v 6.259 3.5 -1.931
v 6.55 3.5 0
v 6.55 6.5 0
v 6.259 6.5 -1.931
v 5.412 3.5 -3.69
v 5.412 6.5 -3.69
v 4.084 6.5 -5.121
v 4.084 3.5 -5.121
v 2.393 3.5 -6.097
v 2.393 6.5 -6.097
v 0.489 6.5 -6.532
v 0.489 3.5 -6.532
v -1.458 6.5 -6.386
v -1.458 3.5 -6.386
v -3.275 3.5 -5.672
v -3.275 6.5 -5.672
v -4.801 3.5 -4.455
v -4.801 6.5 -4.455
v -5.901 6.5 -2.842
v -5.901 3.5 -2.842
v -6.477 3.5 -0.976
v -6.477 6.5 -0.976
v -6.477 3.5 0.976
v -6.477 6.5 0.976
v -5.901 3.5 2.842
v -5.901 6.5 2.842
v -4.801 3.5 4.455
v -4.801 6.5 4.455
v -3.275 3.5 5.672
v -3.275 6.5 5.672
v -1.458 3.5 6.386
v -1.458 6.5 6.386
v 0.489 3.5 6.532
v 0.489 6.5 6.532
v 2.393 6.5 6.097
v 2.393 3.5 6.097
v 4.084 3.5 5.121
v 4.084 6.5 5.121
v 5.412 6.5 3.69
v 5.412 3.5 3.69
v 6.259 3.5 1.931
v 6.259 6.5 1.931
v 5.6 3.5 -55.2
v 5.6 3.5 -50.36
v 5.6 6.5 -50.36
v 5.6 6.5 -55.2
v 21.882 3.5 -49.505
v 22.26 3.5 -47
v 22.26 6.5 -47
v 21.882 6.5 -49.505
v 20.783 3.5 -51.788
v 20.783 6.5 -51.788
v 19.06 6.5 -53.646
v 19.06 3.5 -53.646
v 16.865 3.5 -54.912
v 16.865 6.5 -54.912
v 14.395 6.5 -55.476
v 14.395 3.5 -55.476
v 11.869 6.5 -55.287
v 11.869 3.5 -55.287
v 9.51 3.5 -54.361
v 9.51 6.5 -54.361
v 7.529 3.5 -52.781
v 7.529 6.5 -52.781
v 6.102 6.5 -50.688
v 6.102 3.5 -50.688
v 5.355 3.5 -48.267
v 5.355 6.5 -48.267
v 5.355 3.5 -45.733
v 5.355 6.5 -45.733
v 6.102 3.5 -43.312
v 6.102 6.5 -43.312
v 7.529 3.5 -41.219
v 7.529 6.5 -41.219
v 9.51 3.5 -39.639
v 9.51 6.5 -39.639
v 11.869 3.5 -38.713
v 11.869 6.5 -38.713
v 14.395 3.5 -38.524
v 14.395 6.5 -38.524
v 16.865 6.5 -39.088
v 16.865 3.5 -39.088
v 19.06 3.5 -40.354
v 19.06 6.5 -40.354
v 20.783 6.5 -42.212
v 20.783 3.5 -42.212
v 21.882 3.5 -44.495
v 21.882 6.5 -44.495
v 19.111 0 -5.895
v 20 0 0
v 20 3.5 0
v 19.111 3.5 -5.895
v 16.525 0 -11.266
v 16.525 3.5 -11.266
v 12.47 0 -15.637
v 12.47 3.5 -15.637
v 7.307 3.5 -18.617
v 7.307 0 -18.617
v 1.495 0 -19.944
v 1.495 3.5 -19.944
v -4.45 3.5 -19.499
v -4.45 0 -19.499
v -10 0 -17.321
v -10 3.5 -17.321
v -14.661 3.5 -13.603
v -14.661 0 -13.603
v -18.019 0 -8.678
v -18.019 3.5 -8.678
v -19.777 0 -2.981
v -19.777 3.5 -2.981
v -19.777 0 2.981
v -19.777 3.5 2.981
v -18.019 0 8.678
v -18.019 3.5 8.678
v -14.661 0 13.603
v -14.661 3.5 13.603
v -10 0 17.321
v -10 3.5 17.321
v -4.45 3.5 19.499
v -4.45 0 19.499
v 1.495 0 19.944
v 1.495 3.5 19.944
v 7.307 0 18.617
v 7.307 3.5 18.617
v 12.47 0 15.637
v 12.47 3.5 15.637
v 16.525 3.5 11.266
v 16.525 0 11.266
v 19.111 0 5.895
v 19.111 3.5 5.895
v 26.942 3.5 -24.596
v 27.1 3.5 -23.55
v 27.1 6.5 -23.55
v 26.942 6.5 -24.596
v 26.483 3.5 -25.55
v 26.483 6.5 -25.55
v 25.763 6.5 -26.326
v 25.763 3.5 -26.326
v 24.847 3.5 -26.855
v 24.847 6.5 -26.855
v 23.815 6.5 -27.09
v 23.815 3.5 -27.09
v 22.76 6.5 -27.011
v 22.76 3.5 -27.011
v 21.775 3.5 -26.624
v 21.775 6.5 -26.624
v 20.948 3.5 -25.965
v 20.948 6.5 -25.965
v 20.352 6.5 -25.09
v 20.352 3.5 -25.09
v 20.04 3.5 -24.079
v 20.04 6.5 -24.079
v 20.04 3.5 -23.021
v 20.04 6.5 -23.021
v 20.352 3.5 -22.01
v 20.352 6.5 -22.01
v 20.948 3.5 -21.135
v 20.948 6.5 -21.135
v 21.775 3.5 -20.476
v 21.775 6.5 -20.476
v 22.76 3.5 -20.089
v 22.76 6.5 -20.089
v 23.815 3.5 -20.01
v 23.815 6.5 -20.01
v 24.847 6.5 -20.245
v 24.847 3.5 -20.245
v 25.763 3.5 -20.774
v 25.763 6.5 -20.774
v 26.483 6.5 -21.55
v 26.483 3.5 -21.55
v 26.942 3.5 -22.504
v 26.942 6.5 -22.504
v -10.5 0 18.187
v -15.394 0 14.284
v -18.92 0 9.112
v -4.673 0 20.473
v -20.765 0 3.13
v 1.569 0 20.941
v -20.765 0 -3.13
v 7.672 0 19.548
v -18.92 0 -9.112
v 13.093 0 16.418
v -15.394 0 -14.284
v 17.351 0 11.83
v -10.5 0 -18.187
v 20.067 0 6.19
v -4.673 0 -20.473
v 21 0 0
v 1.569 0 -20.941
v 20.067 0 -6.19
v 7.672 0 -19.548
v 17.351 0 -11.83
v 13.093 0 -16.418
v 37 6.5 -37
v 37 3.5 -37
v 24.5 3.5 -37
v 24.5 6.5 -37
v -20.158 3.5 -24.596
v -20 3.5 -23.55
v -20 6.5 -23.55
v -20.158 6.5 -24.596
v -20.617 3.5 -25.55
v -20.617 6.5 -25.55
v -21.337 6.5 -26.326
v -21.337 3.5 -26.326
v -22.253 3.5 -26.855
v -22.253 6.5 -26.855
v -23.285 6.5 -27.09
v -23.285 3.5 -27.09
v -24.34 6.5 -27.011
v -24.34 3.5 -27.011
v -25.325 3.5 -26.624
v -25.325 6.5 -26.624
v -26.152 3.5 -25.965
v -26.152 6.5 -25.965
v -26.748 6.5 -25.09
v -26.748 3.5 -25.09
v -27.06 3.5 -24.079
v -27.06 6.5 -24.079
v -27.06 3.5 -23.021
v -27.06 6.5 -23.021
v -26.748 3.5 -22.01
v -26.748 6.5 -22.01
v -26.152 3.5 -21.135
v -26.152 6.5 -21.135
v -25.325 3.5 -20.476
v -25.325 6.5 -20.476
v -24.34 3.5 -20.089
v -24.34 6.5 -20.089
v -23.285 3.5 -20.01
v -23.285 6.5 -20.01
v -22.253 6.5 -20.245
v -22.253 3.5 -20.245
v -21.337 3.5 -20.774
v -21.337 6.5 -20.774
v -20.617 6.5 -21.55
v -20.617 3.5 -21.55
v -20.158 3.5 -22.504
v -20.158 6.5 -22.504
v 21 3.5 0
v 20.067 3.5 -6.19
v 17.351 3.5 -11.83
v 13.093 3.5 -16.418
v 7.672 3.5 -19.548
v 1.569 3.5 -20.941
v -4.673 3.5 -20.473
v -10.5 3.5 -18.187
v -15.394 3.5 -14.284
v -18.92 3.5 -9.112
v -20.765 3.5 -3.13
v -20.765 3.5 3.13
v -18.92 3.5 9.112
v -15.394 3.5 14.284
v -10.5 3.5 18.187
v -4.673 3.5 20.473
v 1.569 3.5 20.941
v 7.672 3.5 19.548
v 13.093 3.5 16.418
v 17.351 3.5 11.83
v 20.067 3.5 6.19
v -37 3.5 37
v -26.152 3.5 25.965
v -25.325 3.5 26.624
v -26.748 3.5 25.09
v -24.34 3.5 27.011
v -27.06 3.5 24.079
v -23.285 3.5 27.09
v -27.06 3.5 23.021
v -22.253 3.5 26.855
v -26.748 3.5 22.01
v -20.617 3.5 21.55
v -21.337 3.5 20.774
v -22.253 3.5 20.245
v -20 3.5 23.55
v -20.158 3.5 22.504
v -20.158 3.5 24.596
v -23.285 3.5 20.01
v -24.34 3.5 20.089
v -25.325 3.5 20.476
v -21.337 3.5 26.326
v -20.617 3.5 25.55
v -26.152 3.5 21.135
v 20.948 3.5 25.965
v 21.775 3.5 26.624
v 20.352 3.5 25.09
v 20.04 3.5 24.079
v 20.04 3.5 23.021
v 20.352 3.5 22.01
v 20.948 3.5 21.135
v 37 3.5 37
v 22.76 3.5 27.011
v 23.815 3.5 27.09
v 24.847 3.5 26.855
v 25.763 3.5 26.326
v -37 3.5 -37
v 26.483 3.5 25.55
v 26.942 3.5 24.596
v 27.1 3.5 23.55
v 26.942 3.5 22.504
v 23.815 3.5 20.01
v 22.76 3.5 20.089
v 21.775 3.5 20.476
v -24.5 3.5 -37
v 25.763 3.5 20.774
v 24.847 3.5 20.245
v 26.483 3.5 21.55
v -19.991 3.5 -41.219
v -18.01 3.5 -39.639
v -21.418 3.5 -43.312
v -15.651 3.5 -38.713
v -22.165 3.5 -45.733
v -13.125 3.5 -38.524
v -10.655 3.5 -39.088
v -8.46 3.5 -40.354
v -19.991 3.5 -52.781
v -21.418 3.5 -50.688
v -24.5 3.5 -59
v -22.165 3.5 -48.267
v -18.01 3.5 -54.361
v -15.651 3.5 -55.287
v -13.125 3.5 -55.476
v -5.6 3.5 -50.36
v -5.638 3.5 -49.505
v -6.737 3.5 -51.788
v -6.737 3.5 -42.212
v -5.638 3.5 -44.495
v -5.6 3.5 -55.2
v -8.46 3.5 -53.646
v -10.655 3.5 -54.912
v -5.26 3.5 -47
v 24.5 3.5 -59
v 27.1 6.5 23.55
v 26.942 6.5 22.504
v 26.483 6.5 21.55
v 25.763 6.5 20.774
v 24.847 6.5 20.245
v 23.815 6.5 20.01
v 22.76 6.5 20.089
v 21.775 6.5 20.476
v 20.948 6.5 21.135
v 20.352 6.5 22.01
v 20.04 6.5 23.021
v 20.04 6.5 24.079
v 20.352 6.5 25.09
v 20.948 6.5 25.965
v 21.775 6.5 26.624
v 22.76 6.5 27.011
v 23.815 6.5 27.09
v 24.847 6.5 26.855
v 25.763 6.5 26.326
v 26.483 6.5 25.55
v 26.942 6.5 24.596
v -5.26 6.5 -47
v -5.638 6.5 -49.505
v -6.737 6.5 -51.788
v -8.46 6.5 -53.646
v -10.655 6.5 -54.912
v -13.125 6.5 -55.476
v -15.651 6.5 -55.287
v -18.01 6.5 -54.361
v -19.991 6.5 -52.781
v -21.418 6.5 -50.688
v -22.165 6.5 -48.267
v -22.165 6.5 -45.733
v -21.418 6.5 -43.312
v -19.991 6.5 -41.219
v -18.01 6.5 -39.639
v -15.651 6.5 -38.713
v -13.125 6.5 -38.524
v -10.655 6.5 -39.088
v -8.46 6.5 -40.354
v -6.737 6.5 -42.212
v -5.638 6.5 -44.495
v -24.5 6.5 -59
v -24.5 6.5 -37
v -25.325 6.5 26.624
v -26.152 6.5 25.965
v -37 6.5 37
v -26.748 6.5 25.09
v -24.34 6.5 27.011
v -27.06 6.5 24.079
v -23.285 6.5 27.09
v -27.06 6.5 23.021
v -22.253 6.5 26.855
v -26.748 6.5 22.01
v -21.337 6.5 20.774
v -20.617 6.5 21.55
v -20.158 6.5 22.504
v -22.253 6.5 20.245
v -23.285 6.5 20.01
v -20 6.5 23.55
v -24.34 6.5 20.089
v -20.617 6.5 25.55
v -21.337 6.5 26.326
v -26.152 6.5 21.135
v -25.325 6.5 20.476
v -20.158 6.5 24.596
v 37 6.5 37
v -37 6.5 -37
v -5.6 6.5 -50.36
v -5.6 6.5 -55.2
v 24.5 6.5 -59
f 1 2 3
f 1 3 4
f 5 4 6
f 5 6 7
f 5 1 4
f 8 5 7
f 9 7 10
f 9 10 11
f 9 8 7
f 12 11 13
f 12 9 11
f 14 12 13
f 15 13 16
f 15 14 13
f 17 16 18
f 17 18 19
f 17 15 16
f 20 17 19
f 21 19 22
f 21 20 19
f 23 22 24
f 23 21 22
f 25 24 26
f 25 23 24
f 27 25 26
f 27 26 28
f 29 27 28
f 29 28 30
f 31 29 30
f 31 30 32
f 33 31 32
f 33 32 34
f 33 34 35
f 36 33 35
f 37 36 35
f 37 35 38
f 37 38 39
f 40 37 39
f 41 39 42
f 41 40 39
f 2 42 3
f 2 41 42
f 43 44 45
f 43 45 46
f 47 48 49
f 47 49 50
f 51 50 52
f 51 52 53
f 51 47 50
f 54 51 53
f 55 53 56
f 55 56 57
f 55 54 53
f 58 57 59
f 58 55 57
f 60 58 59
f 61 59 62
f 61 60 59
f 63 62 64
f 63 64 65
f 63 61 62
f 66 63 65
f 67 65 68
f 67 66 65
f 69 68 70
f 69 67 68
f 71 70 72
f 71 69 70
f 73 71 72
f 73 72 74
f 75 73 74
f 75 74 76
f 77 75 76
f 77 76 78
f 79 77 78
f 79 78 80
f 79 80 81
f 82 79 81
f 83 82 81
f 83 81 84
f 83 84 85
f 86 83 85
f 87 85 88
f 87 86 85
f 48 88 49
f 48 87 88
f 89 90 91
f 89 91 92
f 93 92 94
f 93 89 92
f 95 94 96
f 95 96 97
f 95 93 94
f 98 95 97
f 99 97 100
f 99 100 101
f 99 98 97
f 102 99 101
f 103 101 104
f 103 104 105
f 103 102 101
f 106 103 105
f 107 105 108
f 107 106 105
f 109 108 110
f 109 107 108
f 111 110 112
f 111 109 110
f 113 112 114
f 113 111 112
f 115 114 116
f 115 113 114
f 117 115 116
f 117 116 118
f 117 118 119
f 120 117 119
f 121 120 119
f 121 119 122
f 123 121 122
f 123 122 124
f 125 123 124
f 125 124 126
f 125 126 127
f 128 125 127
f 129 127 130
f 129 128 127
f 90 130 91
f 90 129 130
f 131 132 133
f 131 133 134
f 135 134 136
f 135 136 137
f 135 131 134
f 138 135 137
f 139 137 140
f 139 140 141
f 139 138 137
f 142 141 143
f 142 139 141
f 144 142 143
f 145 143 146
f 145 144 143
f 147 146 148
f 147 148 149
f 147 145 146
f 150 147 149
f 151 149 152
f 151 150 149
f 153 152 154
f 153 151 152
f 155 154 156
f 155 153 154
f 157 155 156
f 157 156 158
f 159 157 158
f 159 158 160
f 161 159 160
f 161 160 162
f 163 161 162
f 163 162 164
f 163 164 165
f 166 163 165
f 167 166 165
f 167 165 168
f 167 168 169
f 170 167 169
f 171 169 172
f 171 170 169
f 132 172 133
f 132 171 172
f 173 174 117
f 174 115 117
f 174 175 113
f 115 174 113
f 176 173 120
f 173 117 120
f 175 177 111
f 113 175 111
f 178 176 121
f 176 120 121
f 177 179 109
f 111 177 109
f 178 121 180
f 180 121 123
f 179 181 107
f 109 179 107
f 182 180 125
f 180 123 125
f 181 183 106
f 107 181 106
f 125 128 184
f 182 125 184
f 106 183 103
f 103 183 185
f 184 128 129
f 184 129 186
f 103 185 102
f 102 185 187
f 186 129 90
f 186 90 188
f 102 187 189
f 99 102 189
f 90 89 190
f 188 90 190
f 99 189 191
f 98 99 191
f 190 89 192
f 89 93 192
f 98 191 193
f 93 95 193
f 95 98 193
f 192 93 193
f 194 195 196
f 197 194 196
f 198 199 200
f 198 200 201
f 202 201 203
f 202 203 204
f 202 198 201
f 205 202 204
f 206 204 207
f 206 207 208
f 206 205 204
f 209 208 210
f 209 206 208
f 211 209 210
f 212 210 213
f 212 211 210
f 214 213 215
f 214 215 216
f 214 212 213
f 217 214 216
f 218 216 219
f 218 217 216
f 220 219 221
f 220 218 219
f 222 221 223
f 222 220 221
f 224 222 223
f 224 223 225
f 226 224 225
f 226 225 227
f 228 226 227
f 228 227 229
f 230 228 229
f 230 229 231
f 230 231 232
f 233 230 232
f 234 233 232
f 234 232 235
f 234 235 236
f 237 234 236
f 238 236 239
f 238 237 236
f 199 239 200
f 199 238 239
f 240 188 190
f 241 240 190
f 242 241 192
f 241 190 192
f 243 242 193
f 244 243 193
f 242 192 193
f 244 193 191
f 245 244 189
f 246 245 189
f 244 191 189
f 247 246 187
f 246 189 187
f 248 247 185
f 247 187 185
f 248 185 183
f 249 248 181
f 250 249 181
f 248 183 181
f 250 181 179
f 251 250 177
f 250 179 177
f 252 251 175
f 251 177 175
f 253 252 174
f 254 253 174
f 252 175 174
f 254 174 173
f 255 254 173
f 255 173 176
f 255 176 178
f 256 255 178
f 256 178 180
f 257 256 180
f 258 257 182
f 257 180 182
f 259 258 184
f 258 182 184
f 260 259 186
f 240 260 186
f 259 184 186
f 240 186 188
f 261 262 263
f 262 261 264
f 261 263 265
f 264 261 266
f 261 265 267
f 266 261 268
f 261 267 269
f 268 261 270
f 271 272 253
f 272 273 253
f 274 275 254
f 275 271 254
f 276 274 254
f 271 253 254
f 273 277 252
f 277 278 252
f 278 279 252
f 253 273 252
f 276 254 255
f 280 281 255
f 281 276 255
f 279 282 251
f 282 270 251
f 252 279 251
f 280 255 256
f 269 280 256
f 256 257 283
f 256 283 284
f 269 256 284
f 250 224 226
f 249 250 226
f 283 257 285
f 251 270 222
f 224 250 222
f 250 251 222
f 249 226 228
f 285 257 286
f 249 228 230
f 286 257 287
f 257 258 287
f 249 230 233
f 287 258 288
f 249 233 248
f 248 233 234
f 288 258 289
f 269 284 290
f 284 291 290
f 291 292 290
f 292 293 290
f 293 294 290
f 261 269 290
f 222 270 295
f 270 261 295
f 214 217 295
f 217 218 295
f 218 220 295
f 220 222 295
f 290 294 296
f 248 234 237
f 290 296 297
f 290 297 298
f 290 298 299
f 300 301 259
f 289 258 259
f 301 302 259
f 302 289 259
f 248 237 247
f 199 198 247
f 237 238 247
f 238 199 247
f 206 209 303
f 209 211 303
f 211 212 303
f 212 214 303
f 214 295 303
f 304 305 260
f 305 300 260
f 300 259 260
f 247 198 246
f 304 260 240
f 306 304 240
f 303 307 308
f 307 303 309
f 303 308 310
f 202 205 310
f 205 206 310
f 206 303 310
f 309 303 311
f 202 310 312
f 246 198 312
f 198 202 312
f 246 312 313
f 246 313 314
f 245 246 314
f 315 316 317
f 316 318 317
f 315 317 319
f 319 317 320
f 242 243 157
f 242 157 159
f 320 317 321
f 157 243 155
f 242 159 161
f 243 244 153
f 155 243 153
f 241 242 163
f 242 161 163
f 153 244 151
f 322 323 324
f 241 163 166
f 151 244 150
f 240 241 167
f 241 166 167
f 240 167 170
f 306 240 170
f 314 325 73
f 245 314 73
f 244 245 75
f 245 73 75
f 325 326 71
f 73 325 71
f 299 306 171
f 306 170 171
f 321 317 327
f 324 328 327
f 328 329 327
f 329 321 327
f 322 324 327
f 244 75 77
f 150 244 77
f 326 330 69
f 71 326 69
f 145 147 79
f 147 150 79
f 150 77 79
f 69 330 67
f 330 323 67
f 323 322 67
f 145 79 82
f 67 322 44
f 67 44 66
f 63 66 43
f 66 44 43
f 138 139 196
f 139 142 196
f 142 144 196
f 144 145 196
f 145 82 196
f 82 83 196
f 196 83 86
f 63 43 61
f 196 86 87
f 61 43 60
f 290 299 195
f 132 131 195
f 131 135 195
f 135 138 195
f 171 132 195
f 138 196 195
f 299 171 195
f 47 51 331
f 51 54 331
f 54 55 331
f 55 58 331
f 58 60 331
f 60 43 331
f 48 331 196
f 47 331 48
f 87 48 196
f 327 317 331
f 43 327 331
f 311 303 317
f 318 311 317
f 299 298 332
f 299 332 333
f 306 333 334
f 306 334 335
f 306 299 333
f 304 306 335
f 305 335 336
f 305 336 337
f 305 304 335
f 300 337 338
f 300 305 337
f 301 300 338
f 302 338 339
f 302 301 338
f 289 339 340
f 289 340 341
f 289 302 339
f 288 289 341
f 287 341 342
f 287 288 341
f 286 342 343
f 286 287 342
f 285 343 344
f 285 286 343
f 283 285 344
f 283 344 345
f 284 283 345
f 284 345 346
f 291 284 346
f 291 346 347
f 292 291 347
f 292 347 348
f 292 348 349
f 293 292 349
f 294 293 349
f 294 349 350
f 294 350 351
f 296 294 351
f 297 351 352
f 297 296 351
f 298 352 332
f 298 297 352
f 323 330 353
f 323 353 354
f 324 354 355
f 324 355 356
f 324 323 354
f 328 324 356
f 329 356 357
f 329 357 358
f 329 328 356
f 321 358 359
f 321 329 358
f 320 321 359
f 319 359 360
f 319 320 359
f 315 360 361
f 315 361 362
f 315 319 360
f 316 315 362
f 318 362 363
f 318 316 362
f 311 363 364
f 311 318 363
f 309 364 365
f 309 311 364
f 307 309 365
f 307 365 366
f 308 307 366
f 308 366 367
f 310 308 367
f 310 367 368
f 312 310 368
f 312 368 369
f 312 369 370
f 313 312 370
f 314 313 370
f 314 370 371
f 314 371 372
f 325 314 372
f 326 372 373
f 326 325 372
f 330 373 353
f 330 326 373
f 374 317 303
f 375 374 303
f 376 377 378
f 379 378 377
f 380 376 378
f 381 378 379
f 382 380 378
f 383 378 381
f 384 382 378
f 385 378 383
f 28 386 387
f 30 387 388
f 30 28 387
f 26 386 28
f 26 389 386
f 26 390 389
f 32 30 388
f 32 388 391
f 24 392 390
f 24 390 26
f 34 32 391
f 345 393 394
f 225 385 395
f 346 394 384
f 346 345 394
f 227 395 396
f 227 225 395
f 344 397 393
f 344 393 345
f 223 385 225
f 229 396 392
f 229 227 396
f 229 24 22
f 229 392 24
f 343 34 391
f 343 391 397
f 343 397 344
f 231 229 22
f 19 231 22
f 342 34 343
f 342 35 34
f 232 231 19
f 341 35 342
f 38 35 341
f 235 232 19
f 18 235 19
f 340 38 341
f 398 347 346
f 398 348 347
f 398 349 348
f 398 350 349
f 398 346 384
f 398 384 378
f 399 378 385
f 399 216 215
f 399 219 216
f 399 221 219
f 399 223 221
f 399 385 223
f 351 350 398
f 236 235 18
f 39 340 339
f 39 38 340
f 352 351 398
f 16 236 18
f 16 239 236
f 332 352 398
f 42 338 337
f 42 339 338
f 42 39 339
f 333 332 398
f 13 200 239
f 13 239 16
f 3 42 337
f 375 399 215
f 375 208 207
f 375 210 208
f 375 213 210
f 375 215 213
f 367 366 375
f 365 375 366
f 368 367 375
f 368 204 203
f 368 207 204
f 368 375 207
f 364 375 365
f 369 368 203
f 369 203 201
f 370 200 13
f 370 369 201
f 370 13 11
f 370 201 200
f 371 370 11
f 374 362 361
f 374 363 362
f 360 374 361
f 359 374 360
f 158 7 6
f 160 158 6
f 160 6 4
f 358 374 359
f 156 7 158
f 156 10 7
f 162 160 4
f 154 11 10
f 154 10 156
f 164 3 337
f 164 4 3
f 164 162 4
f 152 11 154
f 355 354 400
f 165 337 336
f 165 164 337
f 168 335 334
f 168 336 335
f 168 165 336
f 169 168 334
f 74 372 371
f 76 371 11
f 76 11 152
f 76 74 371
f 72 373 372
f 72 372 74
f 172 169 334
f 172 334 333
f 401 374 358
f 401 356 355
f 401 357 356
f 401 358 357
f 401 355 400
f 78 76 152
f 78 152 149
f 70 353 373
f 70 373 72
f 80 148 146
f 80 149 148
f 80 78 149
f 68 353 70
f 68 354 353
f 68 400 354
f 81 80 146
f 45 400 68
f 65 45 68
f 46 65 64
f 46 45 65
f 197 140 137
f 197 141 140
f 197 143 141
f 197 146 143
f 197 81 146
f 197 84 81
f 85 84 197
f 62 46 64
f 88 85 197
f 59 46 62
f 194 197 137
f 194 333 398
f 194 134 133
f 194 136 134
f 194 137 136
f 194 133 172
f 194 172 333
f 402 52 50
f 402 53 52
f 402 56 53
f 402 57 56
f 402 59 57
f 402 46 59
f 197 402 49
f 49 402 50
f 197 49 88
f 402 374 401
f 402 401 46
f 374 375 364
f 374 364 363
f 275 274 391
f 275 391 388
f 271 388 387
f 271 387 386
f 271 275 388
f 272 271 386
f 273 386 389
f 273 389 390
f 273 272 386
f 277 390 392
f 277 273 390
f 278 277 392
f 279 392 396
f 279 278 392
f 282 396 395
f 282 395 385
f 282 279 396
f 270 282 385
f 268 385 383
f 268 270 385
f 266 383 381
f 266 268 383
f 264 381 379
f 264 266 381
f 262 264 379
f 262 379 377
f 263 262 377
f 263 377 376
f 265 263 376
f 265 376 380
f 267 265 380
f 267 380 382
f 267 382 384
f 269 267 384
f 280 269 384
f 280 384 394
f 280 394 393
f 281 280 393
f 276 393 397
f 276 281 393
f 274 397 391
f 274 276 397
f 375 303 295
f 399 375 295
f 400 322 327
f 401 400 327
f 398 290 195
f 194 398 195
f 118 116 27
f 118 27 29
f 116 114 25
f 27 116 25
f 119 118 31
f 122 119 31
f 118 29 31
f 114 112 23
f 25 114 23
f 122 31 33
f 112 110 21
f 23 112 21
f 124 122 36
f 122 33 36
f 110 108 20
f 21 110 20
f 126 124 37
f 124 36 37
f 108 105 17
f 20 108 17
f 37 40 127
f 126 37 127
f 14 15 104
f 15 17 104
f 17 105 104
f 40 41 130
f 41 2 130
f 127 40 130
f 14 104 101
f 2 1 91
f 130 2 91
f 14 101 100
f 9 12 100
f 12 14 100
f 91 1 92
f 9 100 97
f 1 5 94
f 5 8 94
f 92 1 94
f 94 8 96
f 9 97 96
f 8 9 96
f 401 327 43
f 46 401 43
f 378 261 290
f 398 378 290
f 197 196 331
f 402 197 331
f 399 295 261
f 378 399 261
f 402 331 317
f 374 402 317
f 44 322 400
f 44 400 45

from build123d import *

# Parameters (mm, degrees)
SKETCH1_R           = 21
SKETCH1_R_2         = 20
BOSS_EXTRUDE1_DEPTH = 3.5
SKETCH2_R           = 3.55
SKETCH2_R_2         = 6.55
SKETCH2_R_3         = 8.5
SKETCH2_W           = 11.2
SKETCH2_H           = 4.84
BOSS_EXTRUDE2_DEPTH = 3


with BuildPart() as part:
    # Sketch1 → Boss-Extrude1 (new body)
    with BuildSketch(Plane(origin=(0, 0, 0), x_dir=(1, 0, 0), z_dir=(0, 1, 0))):
        Circle(SKETCH1_R)
        Circle(SKETCH1_R_2, mode=Mode.SUBTRACT)
    extrude(amount=BOSS_EXTRUDE1_DEPTH)

    # Sketch2 → Boss-Extrude2 (add)
    with BuildSketch(Plane(origin=(0, 3.5, 0), x_dir=(1, 0, 0), z_dir=(0, 1, 0))):
        Polygon((-37, 37), (-37, -37), (37, -37), (37, 37), (24.5, 37), (24.5, 59), (-24.5, 59), (-24.5, 37), align=None)
        with Locations((-23.55, -23.55)):
            Circle(SKETCH2_R, mode=Mode.SUBTRACT)
        Circle(SKETCH2_R_2, mode=Mode.SUBTRACT)
        with Locations((23.55, -23.55)):
            Circle(SKETCH2_R, mode=Mode.SUBTRACT)
        with Locations((-23.55, 23.55)):
            Circle(SKETCH2_R, mode=Mode.SUBTRACT)
        with Locations((23.55, 23.55)):
            Circle(SKETCH2_R, mode=Mode.SUBTRACT)
        with Locations((13.76, 47)):
            Circle(SKETCH2_R_3, mode=Mode.SUBTRACT)
        with Locations((-13.76, 47)):
            Circle(SKETCH2_R_3, mode=Mode.SUBTRACT)
        with Locations((0, 52.78)):
            Rectangle(SKETCH2_W, SKETCH2_H, mode=Mode.SUBTRACT)
    extrude(amount=BOSS_EXTRUDE2_DEPTH)


solid = part.part
